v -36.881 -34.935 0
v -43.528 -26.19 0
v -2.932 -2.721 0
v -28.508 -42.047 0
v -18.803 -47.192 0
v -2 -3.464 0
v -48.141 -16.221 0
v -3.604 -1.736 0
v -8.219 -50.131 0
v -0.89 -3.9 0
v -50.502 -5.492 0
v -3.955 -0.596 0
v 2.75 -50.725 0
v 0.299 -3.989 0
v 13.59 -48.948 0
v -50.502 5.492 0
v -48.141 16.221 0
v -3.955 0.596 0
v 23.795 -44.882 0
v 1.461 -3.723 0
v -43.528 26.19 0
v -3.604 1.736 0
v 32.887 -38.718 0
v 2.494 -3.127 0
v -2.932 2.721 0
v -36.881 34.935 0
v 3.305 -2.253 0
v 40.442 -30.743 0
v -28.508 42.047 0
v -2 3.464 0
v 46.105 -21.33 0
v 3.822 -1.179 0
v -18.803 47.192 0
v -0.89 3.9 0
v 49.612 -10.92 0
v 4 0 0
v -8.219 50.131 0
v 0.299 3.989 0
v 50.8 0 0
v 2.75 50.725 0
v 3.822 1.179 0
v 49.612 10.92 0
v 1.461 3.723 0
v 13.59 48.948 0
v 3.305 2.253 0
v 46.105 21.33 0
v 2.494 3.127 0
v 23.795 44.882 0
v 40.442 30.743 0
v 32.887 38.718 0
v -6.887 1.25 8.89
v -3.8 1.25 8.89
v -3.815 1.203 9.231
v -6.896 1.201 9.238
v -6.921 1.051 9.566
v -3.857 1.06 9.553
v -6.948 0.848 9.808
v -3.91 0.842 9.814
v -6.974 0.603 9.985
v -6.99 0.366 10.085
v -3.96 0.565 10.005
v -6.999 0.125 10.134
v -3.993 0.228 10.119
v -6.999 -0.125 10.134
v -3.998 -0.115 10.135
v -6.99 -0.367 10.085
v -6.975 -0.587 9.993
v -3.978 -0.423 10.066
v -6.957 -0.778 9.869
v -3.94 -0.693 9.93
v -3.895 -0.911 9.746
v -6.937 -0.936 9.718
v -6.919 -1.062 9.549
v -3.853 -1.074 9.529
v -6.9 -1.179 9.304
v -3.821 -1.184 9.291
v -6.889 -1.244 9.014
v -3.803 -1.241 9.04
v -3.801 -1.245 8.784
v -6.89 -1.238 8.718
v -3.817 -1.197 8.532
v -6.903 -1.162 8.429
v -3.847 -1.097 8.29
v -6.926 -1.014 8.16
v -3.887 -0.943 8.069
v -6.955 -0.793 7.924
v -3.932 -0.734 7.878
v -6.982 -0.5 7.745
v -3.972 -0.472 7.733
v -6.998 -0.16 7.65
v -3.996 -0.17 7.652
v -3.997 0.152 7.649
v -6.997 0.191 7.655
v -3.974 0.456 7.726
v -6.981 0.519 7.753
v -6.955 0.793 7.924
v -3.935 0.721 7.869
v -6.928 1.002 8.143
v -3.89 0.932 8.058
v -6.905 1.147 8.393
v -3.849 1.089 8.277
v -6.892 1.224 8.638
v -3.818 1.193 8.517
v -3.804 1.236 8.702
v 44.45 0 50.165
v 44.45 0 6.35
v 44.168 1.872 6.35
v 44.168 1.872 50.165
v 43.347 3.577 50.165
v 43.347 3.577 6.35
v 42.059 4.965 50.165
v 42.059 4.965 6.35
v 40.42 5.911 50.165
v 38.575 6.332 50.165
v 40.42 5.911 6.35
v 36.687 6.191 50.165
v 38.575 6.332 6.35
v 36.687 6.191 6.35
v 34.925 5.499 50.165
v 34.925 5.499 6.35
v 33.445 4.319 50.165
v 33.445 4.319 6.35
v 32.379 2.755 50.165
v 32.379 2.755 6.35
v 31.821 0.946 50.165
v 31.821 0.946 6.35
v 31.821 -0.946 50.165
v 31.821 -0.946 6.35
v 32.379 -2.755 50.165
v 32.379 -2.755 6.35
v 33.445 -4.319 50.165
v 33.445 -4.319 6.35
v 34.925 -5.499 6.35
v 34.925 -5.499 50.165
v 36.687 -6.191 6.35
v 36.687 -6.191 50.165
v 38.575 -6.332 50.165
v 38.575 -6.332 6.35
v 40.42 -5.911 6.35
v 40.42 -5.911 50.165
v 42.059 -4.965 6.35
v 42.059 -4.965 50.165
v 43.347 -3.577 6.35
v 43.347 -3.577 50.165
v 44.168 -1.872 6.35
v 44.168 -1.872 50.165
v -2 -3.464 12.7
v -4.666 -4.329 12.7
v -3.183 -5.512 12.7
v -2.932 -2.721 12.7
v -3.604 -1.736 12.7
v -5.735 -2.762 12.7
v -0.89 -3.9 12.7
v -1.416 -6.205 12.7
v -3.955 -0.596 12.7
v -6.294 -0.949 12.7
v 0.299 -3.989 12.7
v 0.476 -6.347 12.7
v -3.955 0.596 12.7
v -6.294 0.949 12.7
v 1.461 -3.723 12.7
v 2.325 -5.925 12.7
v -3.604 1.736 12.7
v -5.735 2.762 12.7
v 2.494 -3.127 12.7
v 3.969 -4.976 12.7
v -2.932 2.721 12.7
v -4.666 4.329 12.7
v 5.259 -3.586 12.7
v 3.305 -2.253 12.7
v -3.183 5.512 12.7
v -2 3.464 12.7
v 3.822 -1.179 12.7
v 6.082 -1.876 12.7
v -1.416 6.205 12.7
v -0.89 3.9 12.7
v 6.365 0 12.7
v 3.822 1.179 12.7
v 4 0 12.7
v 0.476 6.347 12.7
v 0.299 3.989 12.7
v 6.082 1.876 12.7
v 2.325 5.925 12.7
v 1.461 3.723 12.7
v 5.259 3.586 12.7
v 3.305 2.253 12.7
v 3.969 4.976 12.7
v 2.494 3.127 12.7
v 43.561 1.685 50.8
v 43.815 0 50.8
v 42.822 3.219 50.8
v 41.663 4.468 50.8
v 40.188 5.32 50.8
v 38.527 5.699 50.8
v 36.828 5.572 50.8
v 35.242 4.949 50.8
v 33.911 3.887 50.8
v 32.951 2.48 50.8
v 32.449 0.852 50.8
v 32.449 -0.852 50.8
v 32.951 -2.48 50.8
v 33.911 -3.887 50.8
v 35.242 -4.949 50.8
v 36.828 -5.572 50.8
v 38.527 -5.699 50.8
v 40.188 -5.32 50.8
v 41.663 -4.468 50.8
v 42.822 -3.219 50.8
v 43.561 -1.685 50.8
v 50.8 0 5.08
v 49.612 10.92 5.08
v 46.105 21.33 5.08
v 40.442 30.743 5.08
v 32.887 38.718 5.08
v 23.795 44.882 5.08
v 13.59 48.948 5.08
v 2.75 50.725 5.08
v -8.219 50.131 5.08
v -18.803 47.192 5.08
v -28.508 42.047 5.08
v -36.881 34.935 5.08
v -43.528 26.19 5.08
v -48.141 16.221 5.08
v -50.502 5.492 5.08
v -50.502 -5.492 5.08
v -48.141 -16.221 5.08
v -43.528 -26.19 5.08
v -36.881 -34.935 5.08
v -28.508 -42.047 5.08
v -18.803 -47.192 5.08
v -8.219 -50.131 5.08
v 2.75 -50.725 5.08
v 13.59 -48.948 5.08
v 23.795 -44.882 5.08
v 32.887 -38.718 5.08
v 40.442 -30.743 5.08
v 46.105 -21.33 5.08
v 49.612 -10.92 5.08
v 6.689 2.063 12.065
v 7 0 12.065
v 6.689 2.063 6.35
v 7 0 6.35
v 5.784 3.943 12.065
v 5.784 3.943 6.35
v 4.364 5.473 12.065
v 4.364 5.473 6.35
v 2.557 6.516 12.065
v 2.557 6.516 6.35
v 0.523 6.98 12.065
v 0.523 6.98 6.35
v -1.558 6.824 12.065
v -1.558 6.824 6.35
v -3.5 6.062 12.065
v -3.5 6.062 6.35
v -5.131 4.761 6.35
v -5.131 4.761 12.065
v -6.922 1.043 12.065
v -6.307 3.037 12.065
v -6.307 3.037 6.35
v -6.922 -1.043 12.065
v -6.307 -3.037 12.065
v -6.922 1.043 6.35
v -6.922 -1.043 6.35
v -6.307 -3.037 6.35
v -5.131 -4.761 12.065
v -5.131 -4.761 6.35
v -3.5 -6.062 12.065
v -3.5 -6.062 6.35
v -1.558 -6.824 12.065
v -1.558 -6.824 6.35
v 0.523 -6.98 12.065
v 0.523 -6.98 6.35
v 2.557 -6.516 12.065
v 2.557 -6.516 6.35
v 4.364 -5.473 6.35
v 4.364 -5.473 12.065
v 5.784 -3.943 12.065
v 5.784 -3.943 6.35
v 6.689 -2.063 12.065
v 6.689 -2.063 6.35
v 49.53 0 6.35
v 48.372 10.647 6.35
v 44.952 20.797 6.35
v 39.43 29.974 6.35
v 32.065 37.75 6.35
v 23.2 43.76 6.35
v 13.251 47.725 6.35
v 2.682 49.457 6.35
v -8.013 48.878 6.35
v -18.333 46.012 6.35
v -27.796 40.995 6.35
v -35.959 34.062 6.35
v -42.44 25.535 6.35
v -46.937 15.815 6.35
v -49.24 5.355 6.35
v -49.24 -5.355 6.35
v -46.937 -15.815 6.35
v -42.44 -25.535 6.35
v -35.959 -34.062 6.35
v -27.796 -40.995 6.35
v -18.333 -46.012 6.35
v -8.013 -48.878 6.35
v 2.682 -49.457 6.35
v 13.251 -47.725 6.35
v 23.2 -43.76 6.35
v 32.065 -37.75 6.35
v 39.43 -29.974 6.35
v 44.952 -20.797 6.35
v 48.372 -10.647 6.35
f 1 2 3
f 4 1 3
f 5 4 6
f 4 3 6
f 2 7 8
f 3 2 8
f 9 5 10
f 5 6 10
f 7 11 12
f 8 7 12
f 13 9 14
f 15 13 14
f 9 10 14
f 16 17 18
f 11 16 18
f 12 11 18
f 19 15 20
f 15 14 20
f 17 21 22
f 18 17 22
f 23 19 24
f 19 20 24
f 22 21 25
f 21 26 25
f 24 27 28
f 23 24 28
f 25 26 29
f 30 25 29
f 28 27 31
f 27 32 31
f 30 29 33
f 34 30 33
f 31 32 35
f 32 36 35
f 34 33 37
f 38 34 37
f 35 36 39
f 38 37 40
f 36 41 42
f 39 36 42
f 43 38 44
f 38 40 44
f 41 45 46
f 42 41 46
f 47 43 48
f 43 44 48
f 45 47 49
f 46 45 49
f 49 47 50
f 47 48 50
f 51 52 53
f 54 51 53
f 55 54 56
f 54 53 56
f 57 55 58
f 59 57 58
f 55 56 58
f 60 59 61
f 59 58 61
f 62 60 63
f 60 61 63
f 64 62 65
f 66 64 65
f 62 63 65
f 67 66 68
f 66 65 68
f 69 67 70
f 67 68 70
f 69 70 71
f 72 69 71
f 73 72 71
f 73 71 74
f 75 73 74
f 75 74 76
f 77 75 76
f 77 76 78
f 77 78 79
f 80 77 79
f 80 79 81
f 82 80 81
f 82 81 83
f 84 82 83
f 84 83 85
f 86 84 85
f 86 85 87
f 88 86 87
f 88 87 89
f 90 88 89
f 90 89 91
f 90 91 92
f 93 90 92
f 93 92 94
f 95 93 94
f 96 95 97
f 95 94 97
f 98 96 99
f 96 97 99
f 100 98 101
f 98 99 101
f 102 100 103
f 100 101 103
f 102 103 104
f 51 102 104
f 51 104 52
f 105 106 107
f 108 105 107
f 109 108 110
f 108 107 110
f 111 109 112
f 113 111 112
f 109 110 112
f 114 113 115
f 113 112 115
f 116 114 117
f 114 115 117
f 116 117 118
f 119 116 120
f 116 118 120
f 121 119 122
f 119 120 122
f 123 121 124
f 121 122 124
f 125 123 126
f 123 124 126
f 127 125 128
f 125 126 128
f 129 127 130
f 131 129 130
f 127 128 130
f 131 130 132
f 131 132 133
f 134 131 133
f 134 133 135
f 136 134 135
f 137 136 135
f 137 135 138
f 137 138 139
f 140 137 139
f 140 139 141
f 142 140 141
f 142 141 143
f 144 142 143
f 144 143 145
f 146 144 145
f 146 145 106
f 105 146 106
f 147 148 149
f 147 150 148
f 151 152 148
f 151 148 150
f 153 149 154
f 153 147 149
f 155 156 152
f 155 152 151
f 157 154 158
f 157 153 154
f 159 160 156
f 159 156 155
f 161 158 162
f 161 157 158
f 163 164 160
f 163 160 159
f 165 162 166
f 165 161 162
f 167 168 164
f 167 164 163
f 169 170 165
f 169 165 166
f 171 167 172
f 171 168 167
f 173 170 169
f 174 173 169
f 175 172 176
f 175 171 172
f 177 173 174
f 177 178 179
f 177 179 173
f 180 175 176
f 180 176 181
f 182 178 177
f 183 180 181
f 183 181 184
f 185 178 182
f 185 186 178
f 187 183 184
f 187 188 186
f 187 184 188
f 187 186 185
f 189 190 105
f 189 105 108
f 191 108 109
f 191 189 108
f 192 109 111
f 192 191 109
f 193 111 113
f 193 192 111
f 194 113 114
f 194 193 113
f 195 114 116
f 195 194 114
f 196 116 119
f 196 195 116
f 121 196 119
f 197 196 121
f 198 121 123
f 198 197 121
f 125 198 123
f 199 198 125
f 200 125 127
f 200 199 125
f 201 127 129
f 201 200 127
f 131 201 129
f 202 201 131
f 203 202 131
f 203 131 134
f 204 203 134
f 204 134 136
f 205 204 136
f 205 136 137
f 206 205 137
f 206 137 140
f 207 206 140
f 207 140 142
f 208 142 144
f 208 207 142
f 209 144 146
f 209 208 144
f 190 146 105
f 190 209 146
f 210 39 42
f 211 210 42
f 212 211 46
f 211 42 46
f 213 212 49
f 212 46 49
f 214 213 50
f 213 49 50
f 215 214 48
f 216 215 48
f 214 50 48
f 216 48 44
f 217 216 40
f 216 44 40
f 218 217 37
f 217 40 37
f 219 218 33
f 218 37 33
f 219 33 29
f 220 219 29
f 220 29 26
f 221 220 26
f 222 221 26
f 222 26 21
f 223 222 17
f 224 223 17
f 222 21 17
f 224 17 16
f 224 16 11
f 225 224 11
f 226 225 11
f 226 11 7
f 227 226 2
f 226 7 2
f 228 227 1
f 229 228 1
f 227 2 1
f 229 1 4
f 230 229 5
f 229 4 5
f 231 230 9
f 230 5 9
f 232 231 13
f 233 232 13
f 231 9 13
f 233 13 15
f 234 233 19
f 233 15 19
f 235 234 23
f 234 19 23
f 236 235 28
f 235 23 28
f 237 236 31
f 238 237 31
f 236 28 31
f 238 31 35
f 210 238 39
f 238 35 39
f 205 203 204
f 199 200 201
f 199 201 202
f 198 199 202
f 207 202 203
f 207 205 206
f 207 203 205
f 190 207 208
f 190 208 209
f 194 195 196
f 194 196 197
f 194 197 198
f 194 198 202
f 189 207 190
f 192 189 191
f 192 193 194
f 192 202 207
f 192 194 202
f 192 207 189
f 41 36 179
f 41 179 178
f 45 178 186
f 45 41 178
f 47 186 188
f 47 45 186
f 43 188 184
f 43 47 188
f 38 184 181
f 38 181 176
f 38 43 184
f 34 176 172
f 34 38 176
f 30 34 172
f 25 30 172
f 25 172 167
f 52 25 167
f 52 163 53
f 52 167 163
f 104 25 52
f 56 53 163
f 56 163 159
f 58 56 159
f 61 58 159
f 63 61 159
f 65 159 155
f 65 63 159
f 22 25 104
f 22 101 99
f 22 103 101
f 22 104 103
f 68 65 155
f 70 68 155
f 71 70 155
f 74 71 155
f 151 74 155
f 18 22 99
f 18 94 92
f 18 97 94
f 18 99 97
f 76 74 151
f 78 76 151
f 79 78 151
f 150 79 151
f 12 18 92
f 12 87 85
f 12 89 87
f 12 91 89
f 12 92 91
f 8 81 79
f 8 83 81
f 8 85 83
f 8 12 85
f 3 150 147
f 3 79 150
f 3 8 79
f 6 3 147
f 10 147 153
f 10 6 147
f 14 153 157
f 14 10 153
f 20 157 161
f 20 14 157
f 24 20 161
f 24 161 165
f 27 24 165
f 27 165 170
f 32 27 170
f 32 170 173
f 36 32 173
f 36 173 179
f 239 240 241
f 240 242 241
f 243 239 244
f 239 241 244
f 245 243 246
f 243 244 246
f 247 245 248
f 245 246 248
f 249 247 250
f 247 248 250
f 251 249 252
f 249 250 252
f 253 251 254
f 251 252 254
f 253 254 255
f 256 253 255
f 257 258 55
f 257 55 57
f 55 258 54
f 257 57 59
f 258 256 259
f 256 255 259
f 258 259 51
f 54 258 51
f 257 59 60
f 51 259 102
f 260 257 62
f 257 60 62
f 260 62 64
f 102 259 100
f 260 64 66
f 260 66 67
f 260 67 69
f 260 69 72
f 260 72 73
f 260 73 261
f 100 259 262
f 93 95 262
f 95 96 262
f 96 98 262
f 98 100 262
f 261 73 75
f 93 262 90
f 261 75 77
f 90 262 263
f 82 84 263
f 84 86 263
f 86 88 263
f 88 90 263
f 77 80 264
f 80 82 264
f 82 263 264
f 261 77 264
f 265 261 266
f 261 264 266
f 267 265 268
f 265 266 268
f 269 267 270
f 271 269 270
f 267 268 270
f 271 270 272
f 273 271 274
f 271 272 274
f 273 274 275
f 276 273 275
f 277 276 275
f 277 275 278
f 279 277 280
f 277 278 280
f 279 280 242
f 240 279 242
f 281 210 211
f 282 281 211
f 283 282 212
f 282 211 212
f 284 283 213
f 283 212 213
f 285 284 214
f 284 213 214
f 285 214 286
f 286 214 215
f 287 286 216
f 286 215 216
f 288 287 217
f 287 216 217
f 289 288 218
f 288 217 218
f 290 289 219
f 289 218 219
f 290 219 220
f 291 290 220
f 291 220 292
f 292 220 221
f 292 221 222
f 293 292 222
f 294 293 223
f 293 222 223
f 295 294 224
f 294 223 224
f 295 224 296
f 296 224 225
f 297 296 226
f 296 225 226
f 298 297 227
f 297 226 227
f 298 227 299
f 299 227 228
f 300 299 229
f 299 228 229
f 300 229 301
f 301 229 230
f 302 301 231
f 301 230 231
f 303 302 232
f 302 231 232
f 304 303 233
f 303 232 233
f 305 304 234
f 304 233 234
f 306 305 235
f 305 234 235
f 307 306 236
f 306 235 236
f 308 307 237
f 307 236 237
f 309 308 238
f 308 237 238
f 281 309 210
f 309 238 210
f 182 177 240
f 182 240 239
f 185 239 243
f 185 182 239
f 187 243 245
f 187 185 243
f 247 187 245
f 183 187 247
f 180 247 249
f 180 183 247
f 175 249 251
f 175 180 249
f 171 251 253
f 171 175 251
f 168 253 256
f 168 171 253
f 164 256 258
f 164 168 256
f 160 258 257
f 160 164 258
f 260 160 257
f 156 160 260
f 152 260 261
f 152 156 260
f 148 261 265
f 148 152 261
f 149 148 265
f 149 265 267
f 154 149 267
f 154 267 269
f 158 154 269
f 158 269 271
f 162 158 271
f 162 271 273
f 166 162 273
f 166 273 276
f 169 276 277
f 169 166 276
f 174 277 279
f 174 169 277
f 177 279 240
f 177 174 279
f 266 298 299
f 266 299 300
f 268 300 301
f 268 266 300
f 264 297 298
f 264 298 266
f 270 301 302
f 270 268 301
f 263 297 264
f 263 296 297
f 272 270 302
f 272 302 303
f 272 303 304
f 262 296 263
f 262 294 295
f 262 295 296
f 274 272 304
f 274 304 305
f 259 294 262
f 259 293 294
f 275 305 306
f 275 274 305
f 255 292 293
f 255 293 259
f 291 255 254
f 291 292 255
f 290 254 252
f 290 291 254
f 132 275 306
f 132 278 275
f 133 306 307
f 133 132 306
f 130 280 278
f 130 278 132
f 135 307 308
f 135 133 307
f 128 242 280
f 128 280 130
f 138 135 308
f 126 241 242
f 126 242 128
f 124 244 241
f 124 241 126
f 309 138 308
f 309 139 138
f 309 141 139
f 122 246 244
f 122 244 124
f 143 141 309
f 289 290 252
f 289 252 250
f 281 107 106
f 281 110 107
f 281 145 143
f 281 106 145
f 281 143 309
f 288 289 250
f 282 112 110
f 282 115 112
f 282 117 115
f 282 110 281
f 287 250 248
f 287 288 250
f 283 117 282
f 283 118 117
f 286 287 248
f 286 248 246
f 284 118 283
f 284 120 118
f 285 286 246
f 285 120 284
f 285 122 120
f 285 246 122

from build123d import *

# Parameters (mm, degrees)
F0_R     = 50.8
F0_R_2   = 7
F0_R_3   = 6.35
F1_DEPTH = 6.35
F2_DEPTH = 50.8
F0_R_4   = 4
F3_DEPTH = 12.7
F4_SIZE  = 0.635
F5_R     = 1.25
F6_DEPTH = 25.4
F7_SIZE  = 1.27


with BuildPart() as f1:
    # F0 (on Top) → F1 (new body)
    with BuildSketch(Plane.XY):
        Circle(F0_R)
        Circle(F0_R_2, mode=Mode.SUBTRACT)
        with Locations((38.1, 0)):
            Circle(F0_R_3, mode=Mode.SUBTRACT)
    extrude(amount=F1_DEPTH)

    # F0 (on Top) → F2 (join)
    with BuildSketch(Plane.XY):
        with Locations((38.1, 0)):
            Circle(F0_R_3)
    extrude(amount=F2_DEPTH)

    # F0 (on Top) → F3 (join)
    with BuildSketch(Plane.XY):
        Circle(F0_R_2)
        Circle(F0_R_4, mode=Mode.SUBTRACT)
    extrude(amount=F3_DEPTH)

    # F4
    f4_edges = [f1.edges().sort_by_distance(p)[0] for p in [
        (31.75, 0, 50.8),
        (-7, 0, 12.7),
    ]]
    chamfer(f4_edges, length=F4_SIZE)

    # F5 (on Right) → F6 (cut)
    with BuildSketch(Plane.YZ):
        with Locations((0, 8.89)):
            Circle(F5_R)
    extrude(amount=-F6_DEPTH, mode=Mode.SUBTRACT)

    # F7
    f7_edges = [f1.edges().sort_by_distance(p)[0] for p in [
        (-50.8, 0, 6.35),
    ]]
    chamfer(f7_edges, length=F7_SIZE)


solid = f1.part
